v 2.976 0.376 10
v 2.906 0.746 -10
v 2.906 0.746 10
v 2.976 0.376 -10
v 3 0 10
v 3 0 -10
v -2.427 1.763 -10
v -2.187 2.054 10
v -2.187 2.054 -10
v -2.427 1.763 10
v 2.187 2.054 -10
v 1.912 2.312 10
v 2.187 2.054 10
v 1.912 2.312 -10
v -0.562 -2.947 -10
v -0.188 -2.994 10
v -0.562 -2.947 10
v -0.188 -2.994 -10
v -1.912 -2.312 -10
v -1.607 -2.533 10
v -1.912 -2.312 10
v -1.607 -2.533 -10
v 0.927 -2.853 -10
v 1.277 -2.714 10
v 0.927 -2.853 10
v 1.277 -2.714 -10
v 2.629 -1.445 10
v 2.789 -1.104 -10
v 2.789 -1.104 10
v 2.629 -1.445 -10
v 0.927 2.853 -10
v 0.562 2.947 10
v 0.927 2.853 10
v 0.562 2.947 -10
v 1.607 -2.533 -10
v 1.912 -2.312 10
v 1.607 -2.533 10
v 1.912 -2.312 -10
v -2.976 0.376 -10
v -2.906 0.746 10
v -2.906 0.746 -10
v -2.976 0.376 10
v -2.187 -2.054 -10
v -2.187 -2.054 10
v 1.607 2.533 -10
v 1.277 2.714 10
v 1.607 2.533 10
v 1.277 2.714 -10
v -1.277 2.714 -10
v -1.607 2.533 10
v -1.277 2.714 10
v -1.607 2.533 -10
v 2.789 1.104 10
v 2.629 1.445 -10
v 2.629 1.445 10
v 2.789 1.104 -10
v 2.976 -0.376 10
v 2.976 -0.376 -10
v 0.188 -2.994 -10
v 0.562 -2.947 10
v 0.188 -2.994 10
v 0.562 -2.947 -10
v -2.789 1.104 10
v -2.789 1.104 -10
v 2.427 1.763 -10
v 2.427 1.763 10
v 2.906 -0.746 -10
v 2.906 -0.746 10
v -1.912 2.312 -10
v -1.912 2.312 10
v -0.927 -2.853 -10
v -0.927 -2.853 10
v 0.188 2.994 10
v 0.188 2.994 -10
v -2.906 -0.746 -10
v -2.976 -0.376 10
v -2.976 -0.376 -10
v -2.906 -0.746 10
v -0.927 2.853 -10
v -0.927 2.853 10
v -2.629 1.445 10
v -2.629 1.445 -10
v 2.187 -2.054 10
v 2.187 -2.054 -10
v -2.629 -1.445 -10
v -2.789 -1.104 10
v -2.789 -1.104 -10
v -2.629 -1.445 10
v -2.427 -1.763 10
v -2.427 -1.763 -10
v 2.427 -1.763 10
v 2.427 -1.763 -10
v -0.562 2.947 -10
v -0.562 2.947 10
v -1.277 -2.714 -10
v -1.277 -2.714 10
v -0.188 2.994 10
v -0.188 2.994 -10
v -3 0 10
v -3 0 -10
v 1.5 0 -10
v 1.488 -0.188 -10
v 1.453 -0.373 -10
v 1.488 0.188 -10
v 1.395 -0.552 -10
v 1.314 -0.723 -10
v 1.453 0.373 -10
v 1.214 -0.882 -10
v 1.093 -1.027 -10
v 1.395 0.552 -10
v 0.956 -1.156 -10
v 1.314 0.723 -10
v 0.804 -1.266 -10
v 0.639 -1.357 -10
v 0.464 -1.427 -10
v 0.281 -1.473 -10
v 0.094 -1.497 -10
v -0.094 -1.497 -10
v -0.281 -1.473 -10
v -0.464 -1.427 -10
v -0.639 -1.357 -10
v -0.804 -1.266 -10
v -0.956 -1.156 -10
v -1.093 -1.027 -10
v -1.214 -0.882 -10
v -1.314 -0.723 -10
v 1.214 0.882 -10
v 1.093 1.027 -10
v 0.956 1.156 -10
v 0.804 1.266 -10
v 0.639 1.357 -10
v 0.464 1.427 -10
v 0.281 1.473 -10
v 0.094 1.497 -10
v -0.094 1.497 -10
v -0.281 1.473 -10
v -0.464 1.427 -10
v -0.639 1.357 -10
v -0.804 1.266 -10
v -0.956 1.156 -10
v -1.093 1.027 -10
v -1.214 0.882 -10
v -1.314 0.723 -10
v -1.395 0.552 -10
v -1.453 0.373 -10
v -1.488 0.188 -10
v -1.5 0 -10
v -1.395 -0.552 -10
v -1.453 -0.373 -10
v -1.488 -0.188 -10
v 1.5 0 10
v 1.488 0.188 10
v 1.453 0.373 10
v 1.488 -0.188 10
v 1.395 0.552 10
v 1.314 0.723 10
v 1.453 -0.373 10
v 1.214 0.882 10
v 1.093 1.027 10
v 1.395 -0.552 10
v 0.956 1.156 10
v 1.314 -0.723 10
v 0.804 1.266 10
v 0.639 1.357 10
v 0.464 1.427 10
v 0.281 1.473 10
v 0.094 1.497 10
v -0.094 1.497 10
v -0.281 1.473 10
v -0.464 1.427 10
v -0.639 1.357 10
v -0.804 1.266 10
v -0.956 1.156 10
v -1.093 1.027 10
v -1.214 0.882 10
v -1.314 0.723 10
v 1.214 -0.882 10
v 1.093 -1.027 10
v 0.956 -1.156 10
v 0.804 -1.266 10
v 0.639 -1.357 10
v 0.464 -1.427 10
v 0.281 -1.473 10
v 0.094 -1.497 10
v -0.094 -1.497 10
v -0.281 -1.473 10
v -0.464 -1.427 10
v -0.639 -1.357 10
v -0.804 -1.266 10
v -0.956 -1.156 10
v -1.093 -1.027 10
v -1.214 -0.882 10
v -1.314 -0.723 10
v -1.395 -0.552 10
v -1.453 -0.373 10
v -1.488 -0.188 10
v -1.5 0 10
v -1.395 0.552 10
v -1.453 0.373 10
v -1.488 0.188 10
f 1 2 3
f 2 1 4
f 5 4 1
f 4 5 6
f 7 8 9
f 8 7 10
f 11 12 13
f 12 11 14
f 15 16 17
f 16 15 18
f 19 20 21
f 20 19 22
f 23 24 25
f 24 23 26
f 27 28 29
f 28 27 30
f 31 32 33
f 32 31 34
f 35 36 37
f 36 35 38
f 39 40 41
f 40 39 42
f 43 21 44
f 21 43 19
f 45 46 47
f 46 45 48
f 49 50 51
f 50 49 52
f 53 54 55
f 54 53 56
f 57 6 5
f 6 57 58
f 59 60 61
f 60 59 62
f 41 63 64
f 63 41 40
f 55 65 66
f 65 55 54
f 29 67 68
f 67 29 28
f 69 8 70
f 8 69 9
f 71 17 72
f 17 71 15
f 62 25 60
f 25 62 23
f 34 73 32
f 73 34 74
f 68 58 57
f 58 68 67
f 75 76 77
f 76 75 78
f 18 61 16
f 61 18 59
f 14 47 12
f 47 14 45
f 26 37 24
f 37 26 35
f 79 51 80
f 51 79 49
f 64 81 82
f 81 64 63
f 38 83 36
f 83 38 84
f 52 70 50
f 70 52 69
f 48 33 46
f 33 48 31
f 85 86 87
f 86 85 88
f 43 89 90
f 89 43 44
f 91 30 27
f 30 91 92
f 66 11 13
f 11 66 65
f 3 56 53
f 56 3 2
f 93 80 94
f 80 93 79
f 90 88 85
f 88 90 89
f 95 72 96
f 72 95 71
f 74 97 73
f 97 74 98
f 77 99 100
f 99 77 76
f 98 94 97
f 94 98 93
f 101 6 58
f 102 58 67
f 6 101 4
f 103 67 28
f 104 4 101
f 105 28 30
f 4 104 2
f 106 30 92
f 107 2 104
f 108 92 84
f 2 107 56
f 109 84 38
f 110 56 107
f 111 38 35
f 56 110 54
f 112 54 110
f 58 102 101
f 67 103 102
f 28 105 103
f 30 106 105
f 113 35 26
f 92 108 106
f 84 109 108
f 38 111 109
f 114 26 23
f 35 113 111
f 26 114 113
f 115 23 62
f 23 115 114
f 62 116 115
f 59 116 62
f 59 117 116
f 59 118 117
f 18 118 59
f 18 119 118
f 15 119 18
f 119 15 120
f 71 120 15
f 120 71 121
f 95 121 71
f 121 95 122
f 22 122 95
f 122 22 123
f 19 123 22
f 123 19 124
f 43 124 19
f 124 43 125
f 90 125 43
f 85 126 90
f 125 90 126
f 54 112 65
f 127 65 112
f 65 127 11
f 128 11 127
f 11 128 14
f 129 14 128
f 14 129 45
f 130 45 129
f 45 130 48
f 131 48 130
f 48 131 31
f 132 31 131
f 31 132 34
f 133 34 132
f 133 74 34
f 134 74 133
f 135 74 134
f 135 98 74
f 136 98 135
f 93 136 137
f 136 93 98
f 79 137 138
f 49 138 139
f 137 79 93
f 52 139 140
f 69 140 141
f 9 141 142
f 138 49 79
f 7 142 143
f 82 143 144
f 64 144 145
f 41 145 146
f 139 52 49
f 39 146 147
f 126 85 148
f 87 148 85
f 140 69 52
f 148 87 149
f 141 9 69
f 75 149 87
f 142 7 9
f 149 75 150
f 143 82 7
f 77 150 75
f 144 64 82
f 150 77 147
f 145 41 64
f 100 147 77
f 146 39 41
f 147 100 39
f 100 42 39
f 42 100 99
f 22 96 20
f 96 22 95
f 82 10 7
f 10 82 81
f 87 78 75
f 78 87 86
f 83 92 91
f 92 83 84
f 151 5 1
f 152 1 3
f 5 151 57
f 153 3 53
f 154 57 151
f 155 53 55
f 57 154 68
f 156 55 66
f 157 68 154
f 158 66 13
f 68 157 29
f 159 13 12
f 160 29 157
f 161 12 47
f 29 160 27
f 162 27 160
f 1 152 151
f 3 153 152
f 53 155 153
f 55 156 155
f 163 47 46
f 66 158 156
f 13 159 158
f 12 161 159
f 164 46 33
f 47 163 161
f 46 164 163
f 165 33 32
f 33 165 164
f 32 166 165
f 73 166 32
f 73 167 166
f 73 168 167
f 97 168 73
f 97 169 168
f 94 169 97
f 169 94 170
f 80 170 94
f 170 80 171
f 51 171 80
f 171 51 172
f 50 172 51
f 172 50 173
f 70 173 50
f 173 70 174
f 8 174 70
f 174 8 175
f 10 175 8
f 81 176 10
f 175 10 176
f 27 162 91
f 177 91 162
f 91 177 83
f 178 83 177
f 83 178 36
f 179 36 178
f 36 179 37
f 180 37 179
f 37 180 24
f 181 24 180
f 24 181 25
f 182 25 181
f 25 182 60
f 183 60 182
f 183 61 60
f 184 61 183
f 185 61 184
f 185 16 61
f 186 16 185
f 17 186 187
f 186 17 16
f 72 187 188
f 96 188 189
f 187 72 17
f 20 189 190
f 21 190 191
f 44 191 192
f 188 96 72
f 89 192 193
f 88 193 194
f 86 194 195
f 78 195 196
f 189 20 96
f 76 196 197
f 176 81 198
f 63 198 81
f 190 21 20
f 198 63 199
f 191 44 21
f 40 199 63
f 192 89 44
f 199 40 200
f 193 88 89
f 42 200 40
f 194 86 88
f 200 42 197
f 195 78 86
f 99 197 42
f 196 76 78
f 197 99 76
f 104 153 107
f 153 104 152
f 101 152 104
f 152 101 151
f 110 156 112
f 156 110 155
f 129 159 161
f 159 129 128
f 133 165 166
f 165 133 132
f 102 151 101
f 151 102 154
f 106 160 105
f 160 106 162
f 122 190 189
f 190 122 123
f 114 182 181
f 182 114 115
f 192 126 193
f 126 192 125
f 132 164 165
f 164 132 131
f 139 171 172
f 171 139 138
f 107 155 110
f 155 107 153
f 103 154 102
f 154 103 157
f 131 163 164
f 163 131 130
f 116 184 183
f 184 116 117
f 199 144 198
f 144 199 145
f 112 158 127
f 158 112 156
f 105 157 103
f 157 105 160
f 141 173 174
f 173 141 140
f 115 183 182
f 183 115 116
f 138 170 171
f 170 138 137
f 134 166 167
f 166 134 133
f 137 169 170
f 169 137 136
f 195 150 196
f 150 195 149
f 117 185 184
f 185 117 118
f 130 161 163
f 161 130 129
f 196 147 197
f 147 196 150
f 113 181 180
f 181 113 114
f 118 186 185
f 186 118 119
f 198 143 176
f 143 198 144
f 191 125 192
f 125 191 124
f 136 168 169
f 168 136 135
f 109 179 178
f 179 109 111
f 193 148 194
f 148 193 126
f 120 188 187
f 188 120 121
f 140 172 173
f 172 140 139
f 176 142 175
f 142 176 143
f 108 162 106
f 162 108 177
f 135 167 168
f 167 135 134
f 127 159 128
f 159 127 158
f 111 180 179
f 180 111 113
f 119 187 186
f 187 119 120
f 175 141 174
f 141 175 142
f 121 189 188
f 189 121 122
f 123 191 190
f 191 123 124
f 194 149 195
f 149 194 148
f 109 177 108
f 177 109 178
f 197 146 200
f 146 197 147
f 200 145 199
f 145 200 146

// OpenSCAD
$fn = 50;


difference() {
	union() {
		translate(v = [0, 0, -10.0000000000]) {
			cylinder(h = 20, r = 3.0000000000);
		}
	}
	union() {
		translate(v = [0, 0, -100.0000000000]) {
			cylinder(h = 200, r = 1.5000000000);
		}
	}
}
